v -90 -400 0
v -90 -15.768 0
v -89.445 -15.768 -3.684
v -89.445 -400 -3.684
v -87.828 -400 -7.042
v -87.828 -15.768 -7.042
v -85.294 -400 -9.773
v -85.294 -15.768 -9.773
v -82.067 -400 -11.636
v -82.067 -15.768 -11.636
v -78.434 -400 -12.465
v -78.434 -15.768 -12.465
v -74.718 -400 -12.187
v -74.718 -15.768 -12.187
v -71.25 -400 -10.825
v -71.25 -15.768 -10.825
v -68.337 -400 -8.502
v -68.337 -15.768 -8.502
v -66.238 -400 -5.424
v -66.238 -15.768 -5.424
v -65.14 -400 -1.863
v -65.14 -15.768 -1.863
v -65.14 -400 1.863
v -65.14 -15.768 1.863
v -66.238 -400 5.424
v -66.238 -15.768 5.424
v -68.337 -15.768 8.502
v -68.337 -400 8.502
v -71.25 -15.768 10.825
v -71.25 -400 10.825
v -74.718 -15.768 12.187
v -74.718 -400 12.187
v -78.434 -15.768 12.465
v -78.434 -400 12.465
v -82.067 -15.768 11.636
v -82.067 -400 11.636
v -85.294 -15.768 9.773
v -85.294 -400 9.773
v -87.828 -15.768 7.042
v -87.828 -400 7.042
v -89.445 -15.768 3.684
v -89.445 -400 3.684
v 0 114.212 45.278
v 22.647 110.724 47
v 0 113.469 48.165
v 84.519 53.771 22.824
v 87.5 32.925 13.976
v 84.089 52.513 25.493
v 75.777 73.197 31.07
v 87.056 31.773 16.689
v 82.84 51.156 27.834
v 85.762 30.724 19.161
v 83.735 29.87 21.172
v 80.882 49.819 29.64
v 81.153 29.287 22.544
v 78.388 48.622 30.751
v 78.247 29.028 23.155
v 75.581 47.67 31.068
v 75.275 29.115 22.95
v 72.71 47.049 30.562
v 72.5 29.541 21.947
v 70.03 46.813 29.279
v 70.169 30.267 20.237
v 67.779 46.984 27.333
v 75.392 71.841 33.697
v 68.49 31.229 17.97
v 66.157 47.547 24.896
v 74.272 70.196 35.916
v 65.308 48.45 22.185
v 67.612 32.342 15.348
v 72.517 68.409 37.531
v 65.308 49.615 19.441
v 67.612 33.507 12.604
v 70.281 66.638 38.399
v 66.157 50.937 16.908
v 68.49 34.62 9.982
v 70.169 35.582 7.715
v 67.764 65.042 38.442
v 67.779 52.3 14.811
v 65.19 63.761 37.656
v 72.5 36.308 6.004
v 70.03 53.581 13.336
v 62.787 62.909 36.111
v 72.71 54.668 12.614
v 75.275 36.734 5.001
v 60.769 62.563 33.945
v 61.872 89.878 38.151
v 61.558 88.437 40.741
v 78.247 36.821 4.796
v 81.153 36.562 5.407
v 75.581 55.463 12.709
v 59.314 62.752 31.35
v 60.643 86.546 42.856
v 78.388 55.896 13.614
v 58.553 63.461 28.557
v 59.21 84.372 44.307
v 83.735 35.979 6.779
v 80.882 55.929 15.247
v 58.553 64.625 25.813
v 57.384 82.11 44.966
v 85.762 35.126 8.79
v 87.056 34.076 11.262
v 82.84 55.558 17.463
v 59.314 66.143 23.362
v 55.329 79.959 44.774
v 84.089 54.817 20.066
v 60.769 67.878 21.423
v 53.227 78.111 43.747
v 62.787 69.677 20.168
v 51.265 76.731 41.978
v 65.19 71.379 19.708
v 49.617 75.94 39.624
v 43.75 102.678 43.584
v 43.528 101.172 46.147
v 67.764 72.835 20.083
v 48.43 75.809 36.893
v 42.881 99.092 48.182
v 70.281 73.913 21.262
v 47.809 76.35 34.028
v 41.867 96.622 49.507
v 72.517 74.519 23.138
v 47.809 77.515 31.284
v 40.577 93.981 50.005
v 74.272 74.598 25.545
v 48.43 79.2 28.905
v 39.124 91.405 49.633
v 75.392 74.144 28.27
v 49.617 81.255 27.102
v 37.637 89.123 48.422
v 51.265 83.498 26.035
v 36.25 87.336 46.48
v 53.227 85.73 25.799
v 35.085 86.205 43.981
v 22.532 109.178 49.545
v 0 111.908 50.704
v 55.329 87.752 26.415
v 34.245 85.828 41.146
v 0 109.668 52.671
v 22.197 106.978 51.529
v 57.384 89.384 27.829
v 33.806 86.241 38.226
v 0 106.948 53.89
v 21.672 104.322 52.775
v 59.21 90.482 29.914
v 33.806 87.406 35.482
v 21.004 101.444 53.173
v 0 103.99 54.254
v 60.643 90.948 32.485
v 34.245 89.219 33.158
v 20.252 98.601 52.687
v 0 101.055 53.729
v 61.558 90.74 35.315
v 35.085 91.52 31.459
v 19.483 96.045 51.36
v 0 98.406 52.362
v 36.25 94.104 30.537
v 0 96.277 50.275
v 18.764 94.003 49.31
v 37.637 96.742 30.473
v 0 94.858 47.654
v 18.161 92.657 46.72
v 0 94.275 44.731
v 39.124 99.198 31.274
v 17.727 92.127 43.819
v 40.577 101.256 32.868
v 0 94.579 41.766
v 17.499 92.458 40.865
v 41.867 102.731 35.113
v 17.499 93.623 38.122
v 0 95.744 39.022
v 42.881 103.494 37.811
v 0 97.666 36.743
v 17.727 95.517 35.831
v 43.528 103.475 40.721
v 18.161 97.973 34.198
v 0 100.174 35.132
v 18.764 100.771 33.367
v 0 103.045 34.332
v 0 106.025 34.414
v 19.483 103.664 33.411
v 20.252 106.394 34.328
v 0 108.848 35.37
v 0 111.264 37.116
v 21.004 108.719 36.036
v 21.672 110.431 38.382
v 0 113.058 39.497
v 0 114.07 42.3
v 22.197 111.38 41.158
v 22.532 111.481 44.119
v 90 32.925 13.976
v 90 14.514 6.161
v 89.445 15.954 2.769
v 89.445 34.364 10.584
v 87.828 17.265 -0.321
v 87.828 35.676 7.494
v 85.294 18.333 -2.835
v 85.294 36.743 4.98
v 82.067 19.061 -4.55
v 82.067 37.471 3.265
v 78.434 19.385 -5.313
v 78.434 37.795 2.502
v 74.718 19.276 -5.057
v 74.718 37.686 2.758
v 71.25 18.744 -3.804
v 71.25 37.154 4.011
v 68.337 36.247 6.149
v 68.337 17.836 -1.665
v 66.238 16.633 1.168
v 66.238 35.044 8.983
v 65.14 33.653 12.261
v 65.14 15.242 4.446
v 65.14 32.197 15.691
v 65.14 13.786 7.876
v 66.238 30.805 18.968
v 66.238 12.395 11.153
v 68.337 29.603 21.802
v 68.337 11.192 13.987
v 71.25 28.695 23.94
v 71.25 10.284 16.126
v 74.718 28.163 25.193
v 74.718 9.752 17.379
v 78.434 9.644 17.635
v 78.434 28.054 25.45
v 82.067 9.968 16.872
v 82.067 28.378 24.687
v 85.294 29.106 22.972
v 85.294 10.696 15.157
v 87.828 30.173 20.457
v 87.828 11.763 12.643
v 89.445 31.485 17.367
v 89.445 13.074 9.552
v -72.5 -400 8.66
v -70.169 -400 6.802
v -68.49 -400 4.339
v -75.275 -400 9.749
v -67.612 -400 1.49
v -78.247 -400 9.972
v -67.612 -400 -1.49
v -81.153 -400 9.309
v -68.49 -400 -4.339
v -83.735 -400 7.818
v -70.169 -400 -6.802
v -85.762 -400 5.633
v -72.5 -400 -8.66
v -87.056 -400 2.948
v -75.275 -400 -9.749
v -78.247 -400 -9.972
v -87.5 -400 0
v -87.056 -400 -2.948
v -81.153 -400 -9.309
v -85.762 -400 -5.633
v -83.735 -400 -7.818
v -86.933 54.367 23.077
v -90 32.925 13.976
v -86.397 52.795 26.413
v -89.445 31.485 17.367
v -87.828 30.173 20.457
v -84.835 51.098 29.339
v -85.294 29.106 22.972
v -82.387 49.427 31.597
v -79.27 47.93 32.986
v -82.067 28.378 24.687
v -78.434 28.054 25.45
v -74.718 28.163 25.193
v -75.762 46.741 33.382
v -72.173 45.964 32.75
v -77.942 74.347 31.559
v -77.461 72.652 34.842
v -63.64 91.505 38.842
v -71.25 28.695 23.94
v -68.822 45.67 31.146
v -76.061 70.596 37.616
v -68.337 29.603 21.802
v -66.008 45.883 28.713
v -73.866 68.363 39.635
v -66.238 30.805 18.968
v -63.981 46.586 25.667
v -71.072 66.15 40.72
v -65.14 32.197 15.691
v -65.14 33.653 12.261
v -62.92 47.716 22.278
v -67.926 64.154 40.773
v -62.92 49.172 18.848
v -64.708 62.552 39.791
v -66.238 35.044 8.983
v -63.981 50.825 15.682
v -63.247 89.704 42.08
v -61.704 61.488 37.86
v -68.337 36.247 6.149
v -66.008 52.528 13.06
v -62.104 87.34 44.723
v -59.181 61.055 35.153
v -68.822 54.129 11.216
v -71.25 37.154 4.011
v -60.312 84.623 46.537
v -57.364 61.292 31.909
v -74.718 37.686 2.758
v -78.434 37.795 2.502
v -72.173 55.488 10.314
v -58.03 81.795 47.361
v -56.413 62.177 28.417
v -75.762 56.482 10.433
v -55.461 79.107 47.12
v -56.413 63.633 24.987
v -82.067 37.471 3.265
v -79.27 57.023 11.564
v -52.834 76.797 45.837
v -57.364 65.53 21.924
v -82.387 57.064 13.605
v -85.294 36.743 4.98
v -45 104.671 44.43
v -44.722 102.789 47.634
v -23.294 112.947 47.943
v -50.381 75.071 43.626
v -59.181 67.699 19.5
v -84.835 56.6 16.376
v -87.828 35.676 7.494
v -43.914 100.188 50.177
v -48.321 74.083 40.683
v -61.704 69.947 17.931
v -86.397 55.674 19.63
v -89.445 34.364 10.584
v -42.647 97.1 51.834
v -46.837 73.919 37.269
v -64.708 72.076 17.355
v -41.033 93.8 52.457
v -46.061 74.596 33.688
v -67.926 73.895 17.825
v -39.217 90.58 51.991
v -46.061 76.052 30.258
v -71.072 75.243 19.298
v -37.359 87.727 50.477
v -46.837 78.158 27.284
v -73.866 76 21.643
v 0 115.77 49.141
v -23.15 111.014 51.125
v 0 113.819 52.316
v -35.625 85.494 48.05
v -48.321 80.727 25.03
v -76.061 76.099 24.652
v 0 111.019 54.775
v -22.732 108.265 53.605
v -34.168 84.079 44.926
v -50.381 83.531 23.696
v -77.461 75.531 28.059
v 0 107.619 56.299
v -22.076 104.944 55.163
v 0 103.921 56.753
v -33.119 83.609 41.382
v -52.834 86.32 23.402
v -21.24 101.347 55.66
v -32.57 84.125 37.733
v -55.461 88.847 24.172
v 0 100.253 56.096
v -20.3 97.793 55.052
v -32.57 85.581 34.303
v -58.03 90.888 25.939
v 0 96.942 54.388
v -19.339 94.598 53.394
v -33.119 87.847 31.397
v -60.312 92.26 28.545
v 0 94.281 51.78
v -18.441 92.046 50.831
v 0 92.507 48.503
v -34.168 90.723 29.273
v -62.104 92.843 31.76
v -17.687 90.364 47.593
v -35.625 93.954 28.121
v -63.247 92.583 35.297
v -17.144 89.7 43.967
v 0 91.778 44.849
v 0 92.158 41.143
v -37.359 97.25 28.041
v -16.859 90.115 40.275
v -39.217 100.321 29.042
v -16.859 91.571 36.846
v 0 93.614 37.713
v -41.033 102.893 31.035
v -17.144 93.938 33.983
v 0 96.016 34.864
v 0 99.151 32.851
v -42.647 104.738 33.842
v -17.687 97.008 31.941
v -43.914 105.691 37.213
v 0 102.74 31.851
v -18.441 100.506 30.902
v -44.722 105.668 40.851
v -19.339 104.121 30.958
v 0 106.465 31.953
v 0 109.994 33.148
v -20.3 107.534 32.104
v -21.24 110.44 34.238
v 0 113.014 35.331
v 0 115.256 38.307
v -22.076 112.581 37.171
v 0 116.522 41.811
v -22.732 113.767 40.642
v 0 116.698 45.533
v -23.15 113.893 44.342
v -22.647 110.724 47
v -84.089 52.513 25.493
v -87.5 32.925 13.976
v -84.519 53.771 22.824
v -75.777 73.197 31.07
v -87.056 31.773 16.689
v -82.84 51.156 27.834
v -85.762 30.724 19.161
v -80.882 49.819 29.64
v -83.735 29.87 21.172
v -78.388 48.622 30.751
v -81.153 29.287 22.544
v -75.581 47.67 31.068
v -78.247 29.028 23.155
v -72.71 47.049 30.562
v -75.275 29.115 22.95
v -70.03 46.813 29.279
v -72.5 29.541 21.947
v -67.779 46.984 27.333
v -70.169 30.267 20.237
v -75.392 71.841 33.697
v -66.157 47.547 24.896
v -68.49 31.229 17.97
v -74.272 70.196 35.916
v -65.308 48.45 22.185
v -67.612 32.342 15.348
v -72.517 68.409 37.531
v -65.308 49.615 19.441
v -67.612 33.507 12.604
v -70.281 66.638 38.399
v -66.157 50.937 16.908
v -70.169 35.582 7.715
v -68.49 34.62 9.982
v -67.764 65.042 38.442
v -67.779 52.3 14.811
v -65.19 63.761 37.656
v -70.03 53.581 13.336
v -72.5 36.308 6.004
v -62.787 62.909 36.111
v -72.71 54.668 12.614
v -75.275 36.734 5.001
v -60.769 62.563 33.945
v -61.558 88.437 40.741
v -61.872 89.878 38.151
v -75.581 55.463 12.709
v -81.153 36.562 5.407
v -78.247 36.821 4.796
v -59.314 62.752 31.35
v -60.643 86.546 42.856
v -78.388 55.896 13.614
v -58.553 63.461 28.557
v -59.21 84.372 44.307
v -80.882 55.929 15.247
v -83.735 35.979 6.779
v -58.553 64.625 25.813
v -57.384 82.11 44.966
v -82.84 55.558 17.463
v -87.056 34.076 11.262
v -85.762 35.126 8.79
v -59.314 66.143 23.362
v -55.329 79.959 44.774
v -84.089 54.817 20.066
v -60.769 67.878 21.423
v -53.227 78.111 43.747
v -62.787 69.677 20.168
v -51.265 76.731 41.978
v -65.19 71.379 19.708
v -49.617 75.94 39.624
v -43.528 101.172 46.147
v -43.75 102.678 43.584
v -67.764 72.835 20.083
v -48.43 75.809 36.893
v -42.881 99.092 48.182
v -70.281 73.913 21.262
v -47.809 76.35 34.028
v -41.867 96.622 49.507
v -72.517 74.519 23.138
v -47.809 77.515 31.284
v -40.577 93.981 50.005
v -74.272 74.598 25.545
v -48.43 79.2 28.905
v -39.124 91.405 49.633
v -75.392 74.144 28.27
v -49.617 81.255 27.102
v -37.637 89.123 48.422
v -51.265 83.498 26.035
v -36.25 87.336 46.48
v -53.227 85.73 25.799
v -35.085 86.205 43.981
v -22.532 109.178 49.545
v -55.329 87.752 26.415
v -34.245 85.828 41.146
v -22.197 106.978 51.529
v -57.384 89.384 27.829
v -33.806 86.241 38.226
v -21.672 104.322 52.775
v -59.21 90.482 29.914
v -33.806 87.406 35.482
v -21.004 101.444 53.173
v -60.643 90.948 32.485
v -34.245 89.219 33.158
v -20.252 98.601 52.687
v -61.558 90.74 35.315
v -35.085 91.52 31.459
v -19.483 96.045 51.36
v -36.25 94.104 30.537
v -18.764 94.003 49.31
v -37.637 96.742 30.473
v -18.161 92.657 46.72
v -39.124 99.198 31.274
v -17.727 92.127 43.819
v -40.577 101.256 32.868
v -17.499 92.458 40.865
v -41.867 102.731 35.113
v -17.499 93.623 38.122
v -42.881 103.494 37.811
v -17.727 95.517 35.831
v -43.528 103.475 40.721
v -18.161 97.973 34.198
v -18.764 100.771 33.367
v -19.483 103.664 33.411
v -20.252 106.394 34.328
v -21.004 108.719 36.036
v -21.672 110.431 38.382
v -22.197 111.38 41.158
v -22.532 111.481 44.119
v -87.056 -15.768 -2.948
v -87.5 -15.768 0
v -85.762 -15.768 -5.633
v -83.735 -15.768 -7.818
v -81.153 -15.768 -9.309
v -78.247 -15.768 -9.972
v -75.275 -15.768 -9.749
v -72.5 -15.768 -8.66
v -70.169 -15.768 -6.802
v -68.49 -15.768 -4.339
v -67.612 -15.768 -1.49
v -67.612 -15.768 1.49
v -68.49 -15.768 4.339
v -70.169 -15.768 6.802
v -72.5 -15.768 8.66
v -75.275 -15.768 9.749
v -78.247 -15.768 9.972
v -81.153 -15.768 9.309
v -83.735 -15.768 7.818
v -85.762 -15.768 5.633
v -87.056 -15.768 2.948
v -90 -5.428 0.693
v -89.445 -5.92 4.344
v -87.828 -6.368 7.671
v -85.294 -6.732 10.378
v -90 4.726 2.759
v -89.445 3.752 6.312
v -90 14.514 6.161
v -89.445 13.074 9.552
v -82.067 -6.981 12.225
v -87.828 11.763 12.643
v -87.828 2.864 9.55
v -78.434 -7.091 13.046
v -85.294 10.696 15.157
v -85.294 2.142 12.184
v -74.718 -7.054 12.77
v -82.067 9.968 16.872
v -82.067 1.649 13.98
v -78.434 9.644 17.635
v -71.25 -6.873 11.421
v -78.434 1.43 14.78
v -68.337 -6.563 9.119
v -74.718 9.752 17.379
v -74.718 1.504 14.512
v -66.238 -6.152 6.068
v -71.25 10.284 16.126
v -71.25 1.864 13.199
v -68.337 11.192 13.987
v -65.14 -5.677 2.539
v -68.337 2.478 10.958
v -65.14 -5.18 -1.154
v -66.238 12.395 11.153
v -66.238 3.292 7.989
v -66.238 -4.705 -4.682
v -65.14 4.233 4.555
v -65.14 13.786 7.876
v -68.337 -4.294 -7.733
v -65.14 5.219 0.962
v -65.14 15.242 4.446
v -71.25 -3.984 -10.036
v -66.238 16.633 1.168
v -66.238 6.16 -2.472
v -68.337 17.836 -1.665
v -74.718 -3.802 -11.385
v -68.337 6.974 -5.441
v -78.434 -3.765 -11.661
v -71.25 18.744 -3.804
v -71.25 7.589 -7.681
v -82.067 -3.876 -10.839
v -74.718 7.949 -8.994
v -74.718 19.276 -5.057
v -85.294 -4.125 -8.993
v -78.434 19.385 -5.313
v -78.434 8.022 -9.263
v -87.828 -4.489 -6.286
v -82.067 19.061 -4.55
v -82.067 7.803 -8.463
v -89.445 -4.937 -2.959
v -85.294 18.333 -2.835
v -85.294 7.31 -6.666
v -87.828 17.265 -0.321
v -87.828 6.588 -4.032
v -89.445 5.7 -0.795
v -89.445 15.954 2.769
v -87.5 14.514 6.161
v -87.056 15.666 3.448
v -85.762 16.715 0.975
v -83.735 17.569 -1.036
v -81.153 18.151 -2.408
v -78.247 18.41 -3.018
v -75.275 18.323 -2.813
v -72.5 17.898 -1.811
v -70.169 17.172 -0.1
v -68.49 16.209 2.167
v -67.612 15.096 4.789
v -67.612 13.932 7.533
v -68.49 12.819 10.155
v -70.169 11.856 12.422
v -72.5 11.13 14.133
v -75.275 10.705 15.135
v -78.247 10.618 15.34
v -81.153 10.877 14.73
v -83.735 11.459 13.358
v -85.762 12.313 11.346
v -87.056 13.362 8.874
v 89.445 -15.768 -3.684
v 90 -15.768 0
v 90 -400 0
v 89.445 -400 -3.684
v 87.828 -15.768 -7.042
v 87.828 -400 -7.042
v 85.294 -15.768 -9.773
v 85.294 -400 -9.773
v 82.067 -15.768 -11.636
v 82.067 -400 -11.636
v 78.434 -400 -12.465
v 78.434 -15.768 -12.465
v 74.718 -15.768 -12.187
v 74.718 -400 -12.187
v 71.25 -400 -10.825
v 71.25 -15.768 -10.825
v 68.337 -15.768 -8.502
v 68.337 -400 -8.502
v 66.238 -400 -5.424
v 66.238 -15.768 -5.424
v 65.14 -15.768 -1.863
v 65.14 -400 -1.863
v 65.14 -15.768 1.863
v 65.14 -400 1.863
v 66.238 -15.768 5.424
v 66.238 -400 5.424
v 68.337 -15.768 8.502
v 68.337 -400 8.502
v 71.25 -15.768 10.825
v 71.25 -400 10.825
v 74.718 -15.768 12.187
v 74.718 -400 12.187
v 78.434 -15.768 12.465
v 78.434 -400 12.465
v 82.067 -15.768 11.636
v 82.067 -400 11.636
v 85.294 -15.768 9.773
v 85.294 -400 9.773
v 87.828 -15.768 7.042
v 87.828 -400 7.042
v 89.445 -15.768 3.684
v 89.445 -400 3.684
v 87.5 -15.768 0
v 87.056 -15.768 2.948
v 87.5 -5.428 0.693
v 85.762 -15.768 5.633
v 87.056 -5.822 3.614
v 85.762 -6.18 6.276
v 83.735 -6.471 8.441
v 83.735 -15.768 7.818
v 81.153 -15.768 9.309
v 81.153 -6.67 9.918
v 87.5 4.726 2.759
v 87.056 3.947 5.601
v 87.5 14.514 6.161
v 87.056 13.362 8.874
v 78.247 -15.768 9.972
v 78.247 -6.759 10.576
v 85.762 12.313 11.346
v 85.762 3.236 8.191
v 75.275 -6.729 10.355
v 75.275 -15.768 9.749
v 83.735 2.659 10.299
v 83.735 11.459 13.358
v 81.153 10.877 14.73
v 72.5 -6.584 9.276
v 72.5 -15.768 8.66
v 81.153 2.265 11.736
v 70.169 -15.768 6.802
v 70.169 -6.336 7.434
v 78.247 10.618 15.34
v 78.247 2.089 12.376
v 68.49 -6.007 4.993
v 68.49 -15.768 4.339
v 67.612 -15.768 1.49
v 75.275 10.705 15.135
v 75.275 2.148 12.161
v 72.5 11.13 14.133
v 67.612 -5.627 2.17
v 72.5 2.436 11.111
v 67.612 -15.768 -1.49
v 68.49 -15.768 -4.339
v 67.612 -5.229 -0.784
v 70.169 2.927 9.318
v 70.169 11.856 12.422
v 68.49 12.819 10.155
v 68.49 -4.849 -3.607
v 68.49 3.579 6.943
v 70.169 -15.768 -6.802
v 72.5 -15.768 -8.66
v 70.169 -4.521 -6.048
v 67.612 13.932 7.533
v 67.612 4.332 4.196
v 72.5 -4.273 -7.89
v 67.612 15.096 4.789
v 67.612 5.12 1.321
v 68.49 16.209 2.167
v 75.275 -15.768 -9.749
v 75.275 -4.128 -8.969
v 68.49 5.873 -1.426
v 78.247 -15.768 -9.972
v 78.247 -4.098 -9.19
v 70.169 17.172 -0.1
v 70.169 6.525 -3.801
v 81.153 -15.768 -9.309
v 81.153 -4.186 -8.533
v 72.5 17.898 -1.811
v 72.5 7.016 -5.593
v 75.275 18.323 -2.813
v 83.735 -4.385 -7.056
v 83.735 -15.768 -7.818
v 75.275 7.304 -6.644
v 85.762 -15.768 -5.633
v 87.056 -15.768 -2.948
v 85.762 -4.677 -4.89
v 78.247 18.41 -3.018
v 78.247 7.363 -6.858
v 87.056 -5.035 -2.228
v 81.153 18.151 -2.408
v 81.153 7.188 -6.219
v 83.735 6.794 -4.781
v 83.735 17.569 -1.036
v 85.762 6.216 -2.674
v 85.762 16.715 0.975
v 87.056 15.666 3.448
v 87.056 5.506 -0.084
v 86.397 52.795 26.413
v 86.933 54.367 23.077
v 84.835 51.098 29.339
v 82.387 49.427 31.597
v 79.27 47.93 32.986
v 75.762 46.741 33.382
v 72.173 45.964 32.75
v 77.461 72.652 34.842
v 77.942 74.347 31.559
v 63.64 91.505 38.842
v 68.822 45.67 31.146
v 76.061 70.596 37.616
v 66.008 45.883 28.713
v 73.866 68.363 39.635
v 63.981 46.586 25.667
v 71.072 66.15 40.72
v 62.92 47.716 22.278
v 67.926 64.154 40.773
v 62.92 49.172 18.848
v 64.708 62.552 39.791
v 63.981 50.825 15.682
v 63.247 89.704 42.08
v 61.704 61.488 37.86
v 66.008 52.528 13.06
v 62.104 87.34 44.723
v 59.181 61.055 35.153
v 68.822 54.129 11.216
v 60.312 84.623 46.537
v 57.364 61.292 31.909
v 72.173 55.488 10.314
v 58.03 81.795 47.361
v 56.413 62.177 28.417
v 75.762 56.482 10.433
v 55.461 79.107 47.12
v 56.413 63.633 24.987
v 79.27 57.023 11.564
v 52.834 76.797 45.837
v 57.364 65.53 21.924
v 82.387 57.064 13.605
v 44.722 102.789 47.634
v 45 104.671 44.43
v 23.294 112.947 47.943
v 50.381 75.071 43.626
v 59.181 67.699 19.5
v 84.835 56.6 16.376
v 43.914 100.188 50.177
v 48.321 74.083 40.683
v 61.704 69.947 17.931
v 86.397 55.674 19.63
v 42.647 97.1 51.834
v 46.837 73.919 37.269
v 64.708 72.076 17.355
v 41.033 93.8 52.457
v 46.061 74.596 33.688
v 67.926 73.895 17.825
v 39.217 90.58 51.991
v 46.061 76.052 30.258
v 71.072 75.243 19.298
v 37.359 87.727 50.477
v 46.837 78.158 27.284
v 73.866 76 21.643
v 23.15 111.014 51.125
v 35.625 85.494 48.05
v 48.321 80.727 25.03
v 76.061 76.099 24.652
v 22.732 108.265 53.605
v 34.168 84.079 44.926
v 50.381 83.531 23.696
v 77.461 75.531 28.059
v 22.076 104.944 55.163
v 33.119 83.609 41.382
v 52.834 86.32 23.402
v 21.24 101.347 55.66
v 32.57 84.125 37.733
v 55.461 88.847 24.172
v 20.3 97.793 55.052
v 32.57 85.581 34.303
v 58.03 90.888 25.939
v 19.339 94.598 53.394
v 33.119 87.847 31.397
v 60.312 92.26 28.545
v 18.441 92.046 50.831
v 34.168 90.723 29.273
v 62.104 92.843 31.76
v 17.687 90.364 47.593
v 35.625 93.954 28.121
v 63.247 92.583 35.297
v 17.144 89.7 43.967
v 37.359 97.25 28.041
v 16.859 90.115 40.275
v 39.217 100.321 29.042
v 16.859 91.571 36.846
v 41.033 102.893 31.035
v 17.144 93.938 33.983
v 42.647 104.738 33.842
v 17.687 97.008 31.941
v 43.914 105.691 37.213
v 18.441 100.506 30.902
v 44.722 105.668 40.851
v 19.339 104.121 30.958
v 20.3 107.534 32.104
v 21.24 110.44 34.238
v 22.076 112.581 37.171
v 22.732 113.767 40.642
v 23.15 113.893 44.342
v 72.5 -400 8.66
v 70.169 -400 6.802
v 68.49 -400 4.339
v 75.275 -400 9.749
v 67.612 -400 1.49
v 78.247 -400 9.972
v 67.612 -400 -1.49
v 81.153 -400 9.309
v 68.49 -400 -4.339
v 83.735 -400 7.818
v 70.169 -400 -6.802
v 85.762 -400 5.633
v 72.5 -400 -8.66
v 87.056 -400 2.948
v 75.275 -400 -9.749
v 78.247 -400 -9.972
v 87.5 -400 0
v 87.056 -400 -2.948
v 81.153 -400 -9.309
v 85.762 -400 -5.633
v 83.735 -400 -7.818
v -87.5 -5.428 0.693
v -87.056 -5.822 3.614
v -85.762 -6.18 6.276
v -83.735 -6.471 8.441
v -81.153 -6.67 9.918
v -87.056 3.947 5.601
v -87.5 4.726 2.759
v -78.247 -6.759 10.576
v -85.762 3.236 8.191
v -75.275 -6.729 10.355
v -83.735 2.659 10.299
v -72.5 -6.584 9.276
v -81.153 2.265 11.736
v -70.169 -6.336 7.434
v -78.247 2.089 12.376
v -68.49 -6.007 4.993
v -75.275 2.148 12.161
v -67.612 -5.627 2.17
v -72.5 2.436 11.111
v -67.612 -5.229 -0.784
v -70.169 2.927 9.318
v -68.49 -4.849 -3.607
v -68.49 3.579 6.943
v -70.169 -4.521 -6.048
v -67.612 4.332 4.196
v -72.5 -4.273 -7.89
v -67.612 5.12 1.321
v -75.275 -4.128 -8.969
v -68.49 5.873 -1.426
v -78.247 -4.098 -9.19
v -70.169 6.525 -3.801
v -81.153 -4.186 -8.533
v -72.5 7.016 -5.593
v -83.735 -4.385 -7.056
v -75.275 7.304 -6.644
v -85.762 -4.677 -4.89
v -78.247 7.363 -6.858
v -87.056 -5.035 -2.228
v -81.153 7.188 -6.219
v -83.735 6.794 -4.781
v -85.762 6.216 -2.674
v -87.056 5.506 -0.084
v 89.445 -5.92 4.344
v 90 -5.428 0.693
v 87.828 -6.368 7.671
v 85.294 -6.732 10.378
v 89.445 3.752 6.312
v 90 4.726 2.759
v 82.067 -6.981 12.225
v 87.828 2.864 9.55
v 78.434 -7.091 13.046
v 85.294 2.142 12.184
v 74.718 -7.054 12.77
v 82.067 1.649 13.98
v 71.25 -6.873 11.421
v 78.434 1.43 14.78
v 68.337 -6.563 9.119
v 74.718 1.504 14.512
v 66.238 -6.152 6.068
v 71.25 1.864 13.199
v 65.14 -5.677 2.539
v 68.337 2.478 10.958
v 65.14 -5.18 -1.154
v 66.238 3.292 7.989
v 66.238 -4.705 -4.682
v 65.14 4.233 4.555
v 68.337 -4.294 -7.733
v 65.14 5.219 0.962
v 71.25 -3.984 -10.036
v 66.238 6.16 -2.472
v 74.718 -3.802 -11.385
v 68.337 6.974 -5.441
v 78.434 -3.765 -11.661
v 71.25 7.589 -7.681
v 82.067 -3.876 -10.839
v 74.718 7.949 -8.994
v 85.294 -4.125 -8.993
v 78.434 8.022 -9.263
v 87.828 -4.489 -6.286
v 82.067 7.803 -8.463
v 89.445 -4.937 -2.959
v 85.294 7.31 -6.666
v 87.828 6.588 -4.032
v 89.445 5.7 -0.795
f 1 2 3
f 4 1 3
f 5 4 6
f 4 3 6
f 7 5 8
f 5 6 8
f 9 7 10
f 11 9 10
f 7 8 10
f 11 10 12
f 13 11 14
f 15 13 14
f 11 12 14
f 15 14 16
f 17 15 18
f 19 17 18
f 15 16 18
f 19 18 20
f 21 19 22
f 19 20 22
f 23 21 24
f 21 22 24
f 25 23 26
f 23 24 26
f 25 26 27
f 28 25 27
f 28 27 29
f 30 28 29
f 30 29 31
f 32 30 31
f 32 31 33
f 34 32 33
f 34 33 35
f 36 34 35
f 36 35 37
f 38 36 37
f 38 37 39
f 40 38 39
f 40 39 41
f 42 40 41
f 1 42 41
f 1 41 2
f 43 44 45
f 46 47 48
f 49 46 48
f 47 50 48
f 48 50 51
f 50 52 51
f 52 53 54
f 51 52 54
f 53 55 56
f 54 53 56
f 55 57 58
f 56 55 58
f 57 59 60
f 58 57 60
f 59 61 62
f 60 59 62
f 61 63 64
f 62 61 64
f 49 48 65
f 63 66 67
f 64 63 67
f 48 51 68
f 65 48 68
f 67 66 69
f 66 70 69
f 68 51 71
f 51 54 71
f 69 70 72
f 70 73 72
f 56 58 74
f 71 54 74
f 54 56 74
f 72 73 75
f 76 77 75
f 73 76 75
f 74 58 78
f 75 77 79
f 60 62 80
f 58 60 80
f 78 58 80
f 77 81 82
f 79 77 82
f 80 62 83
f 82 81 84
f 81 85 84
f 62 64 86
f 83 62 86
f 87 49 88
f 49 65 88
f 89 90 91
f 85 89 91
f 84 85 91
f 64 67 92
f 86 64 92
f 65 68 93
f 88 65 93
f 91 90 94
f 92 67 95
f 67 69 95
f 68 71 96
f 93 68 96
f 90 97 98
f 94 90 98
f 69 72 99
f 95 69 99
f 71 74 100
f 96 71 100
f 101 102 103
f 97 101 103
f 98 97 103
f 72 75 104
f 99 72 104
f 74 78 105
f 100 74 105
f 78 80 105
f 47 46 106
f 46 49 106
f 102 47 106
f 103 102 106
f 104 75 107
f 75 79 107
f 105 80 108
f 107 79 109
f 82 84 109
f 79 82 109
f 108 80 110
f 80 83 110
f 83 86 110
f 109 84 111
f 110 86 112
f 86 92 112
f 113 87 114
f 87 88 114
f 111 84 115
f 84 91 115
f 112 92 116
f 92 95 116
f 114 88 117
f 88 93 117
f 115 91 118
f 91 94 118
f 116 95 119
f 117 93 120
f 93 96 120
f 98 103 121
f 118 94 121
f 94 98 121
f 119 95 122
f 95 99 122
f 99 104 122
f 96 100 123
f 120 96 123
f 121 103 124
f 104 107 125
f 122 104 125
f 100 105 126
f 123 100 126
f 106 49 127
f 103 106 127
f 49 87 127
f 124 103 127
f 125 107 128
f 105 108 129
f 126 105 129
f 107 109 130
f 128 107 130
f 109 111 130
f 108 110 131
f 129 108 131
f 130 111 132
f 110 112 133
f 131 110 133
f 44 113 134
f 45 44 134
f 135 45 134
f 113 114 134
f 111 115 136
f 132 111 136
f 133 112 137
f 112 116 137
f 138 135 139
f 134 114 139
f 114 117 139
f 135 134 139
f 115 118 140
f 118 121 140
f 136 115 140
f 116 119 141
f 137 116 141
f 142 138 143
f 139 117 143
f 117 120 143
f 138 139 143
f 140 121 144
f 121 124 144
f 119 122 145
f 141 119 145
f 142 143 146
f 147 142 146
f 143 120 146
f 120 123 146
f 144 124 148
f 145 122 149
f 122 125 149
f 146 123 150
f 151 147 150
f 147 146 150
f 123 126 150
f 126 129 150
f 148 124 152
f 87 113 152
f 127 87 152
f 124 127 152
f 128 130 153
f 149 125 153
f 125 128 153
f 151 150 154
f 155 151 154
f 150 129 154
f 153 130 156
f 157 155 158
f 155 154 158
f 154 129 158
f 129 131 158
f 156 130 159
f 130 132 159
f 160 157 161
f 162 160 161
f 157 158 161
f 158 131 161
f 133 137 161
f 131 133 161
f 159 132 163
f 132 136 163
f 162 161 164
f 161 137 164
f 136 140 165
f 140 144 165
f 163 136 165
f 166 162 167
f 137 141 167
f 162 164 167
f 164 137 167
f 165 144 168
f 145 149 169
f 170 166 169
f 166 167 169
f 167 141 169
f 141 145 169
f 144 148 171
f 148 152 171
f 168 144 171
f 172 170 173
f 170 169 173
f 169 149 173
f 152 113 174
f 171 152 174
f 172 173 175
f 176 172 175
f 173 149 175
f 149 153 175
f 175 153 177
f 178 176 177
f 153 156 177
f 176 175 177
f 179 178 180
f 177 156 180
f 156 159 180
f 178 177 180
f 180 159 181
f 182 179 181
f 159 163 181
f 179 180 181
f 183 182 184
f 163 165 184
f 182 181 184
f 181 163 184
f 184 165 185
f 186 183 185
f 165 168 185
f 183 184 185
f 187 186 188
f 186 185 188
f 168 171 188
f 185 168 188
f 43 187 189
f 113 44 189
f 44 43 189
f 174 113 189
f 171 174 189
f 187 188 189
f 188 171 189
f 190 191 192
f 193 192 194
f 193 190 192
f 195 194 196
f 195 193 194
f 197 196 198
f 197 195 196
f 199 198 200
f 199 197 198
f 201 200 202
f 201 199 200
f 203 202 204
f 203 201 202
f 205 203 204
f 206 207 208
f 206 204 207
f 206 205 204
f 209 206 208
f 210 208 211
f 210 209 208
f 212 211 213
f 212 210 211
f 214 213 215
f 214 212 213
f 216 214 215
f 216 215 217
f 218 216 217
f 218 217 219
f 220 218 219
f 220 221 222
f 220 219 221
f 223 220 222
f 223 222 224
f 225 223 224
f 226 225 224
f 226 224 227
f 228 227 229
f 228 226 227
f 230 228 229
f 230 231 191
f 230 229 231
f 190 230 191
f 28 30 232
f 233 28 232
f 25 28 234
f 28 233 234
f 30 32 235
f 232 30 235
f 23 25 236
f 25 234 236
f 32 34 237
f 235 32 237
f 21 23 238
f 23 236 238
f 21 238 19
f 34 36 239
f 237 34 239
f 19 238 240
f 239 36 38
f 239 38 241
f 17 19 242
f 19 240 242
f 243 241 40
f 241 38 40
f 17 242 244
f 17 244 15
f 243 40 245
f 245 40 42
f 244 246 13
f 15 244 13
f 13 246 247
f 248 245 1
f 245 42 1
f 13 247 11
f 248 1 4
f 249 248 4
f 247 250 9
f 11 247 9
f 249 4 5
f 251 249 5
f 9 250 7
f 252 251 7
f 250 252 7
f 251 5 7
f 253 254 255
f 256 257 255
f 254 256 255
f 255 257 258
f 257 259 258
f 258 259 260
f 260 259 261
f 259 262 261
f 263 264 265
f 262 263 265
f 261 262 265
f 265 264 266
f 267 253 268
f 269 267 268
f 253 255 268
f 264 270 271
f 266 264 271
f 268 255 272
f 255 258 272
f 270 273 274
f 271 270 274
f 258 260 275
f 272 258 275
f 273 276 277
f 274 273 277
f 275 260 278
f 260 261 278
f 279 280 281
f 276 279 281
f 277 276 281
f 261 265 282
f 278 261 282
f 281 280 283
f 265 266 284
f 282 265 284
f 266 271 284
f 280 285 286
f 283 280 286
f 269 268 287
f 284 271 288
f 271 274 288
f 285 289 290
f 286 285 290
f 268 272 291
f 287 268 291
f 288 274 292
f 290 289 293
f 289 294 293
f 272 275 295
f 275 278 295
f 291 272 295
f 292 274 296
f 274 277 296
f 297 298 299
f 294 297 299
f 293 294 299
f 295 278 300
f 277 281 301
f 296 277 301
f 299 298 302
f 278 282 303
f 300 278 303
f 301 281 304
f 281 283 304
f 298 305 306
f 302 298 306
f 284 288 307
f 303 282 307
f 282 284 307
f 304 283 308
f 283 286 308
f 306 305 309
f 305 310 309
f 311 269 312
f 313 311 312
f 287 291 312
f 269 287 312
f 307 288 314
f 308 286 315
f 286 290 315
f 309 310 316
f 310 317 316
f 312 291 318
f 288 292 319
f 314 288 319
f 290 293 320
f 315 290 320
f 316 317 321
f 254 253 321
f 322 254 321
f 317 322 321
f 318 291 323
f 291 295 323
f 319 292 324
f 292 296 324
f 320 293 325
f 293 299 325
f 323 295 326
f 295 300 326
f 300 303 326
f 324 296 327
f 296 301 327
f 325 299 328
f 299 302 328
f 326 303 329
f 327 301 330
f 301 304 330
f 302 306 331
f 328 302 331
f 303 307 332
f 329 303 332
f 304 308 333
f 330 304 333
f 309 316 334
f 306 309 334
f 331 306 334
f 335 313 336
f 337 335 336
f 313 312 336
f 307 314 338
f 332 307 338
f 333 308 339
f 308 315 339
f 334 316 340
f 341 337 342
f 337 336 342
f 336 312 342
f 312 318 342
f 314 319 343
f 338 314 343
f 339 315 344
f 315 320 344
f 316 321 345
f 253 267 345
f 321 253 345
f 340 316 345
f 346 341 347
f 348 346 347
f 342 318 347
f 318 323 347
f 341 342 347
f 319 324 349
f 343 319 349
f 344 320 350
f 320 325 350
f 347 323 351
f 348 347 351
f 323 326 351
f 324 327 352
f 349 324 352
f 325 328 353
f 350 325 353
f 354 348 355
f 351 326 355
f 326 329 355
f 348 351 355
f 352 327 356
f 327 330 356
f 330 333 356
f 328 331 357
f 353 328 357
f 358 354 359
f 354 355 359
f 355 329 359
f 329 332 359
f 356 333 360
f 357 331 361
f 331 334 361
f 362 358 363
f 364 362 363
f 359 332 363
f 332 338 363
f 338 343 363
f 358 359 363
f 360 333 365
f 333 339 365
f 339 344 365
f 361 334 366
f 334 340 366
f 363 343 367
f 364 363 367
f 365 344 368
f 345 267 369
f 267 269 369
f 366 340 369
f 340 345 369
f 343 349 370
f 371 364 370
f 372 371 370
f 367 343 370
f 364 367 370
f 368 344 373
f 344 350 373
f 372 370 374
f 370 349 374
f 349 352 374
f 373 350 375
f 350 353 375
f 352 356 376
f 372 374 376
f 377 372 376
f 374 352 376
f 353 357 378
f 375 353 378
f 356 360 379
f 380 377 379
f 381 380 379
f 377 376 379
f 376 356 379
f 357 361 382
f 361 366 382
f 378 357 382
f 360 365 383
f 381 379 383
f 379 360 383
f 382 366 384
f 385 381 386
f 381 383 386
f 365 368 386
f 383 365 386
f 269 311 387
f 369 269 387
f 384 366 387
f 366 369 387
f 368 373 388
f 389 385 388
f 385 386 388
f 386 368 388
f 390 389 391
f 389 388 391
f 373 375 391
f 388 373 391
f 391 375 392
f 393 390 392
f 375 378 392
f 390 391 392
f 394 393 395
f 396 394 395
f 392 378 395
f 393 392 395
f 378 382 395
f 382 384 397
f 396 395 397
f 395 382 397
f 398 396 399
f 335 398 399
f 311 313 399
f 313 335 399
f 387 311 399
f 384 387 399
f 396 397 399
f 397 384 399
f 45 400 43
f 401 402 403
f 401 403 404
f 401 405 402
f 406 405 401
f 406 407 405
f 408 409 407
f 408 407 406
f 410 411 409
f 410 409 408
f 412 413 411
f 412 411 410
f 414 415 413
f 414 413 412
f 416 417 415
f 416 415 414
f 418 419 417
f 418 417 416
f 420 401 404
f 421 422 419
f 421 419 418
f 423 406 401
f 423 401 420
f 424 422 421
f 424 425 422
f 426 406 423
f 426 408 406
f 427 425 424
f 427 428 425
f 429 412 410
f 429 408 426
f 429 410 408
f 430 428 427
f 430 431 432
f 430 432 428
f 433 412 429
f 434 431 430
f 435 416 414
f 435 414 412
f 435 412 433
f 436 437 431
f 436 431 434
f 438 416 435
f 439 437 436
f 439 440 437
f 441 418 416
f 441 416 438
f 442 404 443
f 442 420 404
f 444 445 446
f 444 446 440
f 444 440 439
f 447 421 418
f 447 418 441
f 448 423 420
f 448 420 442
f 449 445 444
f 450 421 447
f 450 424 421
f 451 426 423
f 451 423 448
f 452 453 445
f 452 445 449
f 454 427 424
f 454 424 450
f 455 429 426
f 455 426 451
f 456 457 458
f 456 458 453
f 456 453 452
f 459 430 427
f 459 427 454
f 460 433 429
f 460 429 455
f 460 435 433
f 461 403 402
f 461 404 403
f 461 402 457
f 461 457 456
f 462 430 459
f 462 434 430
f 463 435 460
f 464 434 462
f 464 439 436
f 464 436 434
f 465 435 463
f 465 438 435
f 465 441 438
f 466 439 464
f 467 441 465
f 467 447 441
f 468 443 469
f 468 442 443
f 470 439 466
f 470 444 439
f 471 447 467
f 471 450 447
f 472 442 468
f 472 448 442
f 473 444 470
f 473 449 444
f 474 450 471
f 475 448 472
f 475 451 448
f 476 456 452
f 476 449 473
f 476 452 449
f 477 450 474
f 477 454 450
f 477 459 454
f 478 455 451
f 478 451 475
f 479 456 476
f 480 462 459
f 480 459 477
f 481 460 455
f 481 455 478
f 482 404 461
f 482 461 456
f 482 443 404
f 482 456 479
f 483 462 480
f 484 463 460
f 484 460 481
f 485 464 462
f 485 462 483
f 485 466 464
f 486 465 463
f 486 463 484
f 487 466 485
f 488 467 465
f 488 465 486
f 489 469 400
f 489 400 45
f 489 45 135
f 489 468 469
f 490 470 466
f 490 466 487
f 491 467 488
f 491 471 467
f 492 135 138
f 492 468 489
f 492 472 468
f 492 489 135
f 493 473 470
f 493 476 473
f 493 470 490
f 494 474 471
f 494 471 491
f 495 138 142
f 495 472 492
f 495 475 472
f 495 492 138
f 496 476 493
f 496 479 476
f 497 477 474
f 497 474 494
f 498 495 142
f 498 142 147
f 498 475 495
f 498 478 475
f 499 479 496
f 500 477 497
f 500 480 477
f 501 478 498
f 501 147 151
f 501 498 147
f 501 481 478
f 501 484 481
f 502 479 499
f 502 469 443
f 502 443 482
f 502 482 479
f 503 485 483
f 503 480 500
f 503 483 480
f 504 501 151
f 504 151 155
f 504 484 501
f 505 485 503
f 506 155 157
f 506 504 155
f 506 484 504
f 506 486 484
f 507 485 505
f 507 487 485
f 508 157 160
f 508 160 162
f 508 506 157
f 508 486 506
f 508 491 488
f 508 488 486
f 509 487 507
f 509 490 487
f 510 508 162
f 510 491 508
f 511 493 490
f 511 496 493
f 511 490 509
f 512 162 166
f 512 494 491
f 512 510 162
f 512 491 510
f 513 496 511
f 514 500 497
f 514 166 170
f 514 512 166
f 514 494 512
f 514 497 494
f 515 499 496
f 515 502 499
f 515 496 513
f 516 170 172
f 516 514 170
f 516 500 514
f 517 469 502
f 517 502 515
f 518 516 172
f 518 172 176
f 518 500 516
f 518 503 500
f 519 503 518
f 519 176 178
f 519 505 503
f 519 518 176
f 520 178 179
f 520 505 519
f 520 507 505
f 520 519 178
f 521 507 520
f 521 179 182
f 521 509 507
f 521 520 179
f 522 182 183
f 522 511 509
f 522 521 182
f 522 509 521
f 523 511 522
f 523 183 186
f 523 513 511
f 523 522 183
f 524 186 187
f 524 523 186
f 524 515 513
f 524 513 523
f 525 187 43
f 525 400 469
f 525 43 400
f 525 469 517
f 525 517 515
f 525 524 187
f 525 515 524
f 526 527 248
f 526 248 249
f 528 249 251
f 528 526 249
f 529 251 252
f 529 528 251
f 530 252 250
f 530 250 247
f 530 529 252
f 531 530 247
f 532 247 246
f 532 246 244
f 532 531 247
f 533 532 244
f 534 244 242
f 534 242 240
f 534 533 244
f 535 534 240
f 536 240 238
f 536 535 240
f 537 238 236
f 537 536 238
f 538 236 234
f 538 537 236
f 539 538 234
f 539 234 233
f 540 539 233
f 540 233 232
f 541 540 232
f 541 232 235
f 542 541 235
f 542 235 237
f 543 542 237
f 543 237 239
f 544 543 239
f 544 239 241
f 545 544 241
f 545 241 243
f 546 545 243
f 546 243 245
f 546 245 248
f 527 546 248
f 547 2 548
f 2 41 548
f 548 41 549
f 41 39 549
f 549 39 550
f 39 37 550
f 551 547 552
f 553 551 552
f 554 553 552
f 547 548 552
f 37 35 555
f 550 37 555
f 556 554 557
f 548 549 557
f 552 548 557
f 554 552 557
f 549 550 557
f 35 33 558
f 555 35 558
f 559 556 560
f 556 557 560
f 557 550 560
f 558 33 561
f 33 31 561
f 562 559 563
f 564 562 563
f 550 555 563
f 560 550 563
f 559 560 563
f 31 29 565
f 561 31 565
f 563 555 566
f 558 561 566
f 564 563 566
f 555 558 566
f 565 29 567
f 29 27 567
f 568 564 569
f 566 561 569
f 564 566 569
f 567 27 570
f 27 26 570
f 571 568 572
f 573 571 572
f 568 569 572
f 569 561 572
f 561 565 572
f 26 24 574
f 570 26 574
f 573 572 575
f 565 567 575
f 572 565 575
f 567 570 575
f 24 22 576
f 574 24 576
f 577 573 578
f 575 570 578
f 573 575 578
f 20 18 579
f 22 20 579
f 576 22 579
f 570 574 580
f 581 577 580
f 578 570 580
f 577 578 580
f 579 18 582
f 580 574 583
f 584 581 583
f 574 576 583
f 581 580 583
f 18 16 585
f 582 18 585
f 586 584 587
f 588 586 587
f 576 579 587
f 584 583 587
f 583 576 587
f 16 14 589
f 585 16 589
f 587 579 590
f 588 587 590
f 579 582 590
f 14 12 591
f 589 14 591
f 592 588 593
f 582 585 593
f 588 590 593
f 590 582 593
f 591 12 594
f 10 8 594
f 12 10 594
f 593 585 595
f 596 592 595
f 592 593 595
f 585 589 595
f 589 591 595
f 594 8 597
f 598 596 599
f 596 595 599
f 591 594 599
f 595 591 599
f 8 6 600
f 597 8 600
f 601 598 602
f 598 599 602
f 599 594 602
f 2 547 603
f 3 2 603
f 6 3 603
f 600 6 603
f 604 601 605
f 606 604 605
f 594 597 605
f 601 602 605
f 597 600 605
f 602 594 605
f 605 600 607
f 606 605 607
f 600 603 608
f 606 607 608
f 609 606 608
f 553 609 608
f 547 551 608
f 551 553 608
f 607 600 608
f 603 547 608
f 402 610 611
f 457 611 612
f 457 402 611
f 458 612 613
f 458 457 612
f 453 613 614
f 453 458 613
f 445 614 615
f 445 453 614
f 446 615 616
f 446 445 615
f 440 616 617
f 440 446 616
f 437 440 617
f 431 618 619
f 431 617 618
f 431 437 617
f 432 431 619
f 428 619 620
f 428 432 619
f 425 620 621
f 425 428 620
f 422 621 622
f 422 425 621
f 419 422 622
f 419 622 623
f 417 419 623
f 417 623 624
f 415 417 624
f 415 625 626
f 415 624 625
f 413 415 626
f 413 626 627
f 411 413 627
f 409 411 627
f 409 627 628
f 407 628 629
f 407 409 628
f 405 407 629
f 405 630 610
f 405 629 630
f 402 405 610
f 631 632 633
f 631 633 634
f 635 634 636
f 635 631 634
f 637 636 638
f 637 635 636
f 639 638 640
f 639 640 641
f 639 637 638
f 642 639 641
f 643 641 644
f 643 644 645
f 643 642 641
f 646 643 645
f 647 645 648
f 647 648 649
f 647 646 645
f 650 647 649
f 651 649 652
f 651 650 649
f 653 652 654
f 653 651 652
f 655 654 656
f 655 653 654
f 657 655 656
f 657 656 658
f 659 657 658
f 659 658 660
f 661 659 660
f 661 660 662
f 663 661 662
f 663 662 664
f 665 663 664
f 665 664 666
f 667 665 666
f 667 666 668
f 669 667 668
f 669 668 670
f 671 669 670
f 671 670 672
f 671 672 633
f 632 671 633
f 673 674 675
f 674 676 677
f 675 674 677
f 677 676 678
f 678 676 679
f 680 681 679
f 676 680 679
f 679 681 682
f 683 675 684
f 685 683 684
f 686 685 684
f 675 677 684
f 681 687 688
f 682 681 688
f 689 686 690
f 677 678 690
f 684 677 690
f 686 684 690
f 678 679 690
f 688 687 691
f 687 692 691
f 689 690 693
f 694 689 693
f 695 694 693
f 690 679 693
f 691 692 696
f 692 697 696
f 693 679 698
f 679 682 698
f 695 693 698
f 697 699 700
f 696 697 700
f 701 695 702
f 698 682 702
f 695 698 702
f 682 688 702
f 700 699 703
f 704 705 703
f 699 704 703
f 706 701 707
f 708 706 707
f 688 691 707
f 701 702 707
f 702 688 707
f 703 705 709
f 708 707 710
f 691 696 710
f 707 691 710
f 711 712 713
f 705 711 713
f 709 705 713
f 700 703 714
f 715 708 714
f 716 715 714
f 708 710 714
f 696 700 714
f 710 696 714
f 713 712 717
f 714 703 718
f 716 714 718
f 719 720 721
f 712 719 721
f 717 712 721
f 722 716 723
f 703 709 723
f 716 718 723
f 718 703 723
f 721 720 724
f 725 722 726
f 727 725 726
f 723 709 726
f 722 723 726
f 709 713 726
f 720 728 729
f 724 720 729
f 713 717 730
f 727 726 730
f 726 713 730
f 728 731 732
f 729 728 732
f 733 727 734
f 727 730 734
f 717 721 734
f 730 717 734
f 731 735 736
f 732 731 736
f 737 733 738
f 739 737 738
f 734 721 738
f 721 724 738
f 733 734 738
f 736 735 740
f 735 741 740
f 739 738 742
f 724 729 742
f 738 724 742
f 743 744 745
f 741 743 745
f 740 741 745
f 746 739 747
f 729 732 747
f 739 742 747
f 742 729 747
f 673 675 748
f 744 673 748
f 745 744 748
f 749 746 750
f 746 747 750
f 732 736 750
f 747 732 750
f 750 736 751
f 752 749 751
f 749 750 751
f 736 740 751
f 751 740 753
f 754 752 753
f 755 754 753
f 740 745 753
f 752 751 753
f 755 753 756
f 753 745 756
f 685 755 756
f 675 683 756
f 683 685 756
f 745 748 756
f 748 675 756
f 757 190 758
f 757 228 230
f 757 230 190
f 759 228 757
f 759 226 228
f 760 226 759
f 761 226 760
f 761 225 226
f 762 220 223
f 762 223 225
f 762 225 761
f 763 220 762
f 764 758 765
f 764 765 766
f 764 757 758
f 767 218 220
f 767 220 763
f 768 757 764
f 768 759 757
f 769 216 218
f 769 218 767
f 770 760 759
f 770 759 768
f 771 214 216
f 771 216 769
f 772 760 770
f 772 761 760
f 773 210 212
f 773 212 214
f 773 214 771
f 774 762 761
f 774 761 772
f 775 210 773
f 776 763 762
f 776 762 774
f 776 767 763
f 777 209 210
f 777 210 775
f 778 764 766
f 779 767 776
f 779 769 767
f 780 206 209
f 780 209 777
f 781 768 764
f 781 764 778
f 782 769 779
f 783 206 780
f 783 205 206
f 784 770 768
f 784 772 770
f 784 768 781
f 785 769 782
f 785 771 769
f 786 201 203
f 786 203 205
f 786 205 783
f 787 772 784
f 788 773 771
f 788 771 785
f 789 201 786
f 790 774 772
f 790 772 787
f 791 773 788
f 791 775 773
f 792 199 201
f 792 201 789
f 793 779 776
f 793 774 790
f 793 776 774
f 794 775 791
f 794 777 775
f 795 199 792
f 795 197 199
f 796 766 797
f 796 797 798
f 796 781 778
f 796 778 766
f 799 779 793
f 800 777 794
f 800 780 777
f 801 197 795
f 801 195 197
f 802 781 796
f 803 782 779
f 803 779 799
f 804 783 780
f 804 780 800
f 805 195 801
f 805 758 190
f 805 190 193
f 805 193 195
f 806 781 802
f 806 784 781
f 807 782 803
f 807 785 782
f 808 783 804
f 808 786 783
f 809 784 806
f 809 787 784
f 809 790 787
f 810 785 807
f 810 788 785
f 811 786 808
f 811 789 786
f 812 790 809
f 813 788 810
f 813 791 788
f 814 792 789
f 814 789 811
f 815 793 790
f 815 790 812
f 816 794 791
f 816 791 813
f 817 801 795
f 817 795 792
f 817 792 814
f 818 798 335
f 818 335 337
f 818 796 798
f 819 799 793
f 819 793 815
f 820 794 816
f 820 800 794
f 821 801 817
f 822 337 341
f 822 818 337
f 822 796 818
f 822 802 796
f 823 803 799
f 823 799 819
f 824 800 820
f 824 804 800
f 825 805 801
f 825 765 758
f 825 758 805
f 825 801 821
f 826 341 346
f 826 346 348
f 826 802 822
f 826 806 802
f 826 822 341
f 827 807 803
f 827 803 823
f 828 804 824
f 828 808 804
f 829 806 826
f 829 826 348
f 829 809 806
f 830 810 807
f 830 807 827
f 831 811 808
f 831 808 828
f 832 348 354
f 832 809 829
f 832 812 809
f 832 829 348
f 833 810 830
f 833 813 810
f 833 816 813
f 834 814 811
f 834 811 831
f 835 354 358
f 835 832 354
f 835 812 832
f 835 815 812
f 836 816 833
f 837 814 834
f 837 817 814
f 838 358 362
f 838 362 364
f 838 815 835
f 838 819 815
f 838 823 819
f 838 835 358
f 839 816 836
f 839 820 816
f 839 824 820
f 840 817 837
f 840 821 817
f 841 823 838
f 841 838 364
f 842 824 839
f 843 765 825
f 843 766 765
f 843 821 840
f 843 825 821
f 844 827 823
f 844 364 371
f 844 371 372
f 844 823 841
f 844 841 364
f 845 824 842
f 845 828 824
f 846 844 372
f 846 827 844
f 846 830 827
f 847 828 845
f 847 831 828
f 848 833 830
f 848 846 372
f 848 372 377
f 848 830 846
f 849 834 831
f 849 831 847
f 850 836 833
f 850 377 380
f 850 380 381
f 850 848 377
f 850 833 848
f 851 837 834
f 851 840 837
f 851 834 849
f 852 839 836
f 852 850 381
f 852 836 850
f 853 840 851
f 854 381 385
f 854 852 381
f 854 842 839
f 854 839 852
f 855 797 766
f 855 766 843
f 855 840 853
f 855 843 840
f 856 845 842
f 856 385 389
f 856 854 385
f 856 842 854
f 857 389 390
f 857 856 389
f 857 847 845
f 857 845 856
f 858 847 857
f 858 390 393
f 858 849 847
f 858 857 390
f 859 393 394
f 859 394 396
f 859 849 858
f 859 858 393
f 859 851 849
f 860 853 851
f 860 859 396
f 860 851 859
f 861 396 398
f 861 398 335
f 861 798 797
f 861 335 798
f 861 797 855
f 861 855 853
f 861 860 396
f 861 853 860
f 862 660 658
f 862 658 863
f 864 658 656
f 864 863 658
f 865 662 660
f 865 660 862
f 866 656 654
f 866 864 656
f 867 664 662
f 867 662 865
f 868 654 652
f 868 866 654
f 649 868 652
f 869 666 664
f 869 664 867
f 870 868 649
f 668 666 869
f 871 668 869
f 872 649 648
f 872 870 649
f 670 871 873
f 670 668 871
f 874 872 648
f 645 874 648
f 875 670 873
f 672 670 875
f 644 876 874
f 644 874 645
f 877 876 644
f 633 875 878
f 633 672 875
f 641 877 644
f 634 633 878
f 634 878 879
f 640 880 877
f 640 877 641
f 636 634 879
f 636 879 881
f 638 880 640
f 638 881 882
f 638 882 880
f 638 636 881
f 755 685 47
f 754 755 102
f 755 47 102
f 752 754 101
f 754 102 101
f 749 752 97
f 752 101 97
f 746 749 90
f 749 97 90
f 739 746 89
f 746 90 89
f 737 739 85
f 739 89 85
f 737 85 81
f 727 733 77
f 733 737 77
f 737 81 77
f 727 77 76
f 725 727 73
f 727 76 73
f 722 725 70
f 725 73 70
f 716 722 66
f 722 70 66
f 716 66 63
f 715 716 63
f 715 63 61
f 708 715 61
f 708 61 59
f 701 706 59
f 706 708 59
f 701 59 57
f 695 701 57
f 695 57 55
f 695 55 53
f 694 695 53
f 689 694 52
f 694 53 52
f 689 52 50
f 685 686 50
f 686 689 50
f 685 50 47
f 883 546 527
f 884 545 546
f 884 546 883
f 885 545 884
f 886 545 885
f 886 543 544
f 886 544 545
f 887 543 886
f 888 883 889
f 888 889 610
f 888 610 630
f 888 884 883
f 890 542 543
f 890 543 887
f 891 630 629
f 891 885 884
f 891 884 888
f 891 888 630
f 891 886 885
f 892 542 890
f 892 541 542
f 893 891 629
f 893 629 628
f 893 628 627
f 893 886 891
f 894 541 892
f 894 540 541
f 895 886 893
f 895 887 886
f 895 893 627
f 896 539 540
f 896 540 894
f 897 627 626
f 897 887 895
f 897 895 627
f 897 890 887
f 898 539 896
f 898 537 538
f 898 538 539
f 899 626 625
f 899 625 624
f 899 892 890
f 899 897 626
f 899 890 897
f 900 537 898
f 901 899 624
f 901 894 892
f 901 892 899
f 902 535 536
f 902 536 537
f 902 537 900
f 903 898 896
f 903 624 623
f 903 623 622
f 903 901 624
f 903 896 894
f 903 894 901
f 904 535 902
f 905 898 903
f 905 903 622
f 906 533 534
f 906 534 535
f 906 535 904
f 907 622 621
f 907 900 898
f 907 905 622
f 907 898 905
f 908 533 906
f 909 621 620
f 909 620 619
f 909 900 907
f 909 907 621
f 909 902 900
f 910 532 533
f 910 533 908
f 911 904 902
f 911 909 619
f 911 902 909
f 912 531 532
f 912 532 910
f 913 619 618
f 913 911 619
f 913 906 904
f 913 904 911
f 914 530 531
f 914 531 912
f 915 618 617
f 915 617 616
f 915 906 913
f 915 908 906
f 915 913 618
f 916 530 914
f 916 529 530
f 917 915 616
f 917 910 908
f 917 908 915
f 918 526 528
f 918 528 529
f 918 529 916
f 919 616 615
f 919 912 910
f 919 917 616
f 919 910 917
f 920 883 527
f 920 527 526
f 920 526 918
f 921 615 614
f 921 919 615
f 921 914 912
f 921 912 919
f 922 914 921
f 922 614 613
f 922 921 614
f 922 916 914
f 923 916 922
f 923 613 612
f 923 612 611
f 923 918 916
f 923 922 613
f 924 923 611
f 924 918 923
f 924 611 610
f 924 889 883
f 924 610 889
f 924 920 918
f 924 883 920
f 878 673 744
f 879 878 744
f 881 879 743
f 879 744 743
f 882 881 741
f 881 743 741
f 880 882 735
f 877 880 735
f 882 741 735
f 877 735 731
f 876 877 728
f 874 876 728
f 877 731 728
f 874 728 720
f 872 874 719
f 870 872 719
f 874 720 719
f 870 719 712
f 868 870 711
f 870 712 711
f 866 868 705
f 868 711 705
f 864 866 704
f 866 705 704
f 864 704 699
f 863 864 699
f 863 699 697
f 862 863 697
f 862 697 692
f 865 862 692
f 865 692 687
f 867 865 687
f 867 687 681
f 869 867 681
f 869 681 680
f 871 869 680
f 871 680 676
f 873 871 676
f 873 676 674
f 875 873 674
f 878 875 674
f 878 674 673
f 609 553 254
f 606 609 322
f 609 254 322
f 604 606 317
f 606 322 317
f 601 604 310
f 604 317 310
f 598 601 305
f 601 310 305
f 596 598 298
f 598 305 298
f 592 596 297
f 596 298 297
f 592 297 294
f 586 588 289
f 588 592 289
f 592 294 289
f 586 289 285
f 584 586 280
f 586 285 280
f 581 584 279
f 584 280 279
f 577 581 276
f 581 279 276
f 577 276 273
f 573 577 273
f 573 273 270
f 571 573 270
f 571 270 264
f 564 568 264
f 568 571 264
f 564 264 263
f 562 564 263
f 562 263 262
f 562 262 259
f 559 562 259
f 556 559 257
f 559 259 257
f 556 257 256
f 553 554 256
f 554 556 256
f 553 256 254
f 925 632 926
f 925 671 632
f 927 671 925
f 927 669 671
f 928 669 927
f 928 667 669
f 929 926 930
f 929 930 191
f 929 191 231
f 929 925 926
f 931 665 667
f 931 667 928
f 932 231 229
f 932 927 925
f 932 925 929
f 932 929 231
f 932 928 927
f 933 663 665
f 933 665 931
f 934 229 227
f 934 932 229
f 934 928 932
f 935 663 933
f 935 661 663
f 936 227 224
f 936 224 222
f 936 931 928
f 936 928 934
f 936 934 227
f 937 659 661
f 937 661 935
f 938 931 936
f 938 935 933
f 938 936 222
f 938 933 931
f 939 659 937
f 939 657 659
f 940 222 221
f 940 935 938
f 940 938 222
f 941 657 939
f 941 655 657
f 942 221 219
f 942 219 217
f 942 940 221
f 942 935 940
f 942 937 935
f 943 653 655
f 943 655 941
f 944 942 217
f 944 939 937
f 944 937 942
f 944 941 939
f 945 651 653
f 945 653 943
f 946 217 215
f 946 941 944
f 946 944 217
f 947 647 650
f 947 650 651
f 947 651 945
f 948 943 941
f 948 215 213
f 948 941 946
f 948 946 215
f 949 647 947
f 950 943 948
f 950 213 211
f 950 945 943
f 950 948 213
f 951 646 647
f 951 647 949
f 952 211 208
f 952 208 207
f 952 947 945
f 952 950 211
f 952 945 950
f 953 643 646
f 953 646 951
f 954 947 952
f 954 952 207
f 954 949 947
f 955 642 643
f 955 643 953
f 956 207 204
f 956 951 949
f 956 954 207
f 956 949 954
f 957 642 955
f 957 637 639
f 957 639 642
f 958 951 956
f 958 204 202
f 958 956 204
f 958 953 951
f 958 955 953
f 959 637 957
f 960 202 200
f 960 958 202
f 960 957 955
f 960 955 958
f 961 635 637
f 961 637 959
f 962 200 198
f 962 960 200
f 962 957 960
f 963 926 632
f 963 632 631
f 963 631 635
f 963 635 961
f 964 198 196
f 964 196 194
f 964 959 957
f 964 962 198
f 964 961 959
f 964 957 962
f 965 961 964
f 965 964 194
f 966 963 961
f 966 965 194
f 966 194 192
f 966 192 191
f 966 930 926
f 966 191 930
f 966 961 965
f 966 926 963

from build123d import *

# Parameters (mm, degrees)
F5_R   = 12.5
F5_R_2 = 9.9999973178


with BuildPart() as f8:
    # F8: sweep along a path in F7, F3
    with BuildLine(Plane(origin=(77.5, 0, 0), x_dir=(0, -1, 0), z_dir=(-1, 0, 0))) as f8_path:
        Line((400, 0), (15.7675532053, 0))
        ThreePointArc((15.7675532053, 0), (0.316538288, 1.5558353919), (-14.5141092526, 6.1608738574))
        Line((-14.5141092526, 6.1608738574), (-32.9246175983, 13.9756710038))
    with BuildLine(Plane(origin=(0, 0, 0), x_dir=(1, 0, 0), z_dir=(0, 0.3907311285, -0.9205048535))) as f8_path_2:
        ThreePointArc((77.5, -35.768), (54.800775542, -90.568775542), (0, -113.268))
    # F5 (on plane+point) → F8 (sweep)
    with BuildSketch(Plane.XZ.offset(400)):
        with Locations((77.5, 0)):
            Circle(F5_R)
        with Locations((77.5, 0)):
            Circle(F5_R_2, mode=Mode.SUBTRACT)
    sweep(path=f8_path.line + f8_path_2.line)

    # F9: F8 across plane


with BuildPart() as f8_1:
    add(f8.part)
    add(f8.part.mirror(Plane.YZ))


solid = f8_1.part
